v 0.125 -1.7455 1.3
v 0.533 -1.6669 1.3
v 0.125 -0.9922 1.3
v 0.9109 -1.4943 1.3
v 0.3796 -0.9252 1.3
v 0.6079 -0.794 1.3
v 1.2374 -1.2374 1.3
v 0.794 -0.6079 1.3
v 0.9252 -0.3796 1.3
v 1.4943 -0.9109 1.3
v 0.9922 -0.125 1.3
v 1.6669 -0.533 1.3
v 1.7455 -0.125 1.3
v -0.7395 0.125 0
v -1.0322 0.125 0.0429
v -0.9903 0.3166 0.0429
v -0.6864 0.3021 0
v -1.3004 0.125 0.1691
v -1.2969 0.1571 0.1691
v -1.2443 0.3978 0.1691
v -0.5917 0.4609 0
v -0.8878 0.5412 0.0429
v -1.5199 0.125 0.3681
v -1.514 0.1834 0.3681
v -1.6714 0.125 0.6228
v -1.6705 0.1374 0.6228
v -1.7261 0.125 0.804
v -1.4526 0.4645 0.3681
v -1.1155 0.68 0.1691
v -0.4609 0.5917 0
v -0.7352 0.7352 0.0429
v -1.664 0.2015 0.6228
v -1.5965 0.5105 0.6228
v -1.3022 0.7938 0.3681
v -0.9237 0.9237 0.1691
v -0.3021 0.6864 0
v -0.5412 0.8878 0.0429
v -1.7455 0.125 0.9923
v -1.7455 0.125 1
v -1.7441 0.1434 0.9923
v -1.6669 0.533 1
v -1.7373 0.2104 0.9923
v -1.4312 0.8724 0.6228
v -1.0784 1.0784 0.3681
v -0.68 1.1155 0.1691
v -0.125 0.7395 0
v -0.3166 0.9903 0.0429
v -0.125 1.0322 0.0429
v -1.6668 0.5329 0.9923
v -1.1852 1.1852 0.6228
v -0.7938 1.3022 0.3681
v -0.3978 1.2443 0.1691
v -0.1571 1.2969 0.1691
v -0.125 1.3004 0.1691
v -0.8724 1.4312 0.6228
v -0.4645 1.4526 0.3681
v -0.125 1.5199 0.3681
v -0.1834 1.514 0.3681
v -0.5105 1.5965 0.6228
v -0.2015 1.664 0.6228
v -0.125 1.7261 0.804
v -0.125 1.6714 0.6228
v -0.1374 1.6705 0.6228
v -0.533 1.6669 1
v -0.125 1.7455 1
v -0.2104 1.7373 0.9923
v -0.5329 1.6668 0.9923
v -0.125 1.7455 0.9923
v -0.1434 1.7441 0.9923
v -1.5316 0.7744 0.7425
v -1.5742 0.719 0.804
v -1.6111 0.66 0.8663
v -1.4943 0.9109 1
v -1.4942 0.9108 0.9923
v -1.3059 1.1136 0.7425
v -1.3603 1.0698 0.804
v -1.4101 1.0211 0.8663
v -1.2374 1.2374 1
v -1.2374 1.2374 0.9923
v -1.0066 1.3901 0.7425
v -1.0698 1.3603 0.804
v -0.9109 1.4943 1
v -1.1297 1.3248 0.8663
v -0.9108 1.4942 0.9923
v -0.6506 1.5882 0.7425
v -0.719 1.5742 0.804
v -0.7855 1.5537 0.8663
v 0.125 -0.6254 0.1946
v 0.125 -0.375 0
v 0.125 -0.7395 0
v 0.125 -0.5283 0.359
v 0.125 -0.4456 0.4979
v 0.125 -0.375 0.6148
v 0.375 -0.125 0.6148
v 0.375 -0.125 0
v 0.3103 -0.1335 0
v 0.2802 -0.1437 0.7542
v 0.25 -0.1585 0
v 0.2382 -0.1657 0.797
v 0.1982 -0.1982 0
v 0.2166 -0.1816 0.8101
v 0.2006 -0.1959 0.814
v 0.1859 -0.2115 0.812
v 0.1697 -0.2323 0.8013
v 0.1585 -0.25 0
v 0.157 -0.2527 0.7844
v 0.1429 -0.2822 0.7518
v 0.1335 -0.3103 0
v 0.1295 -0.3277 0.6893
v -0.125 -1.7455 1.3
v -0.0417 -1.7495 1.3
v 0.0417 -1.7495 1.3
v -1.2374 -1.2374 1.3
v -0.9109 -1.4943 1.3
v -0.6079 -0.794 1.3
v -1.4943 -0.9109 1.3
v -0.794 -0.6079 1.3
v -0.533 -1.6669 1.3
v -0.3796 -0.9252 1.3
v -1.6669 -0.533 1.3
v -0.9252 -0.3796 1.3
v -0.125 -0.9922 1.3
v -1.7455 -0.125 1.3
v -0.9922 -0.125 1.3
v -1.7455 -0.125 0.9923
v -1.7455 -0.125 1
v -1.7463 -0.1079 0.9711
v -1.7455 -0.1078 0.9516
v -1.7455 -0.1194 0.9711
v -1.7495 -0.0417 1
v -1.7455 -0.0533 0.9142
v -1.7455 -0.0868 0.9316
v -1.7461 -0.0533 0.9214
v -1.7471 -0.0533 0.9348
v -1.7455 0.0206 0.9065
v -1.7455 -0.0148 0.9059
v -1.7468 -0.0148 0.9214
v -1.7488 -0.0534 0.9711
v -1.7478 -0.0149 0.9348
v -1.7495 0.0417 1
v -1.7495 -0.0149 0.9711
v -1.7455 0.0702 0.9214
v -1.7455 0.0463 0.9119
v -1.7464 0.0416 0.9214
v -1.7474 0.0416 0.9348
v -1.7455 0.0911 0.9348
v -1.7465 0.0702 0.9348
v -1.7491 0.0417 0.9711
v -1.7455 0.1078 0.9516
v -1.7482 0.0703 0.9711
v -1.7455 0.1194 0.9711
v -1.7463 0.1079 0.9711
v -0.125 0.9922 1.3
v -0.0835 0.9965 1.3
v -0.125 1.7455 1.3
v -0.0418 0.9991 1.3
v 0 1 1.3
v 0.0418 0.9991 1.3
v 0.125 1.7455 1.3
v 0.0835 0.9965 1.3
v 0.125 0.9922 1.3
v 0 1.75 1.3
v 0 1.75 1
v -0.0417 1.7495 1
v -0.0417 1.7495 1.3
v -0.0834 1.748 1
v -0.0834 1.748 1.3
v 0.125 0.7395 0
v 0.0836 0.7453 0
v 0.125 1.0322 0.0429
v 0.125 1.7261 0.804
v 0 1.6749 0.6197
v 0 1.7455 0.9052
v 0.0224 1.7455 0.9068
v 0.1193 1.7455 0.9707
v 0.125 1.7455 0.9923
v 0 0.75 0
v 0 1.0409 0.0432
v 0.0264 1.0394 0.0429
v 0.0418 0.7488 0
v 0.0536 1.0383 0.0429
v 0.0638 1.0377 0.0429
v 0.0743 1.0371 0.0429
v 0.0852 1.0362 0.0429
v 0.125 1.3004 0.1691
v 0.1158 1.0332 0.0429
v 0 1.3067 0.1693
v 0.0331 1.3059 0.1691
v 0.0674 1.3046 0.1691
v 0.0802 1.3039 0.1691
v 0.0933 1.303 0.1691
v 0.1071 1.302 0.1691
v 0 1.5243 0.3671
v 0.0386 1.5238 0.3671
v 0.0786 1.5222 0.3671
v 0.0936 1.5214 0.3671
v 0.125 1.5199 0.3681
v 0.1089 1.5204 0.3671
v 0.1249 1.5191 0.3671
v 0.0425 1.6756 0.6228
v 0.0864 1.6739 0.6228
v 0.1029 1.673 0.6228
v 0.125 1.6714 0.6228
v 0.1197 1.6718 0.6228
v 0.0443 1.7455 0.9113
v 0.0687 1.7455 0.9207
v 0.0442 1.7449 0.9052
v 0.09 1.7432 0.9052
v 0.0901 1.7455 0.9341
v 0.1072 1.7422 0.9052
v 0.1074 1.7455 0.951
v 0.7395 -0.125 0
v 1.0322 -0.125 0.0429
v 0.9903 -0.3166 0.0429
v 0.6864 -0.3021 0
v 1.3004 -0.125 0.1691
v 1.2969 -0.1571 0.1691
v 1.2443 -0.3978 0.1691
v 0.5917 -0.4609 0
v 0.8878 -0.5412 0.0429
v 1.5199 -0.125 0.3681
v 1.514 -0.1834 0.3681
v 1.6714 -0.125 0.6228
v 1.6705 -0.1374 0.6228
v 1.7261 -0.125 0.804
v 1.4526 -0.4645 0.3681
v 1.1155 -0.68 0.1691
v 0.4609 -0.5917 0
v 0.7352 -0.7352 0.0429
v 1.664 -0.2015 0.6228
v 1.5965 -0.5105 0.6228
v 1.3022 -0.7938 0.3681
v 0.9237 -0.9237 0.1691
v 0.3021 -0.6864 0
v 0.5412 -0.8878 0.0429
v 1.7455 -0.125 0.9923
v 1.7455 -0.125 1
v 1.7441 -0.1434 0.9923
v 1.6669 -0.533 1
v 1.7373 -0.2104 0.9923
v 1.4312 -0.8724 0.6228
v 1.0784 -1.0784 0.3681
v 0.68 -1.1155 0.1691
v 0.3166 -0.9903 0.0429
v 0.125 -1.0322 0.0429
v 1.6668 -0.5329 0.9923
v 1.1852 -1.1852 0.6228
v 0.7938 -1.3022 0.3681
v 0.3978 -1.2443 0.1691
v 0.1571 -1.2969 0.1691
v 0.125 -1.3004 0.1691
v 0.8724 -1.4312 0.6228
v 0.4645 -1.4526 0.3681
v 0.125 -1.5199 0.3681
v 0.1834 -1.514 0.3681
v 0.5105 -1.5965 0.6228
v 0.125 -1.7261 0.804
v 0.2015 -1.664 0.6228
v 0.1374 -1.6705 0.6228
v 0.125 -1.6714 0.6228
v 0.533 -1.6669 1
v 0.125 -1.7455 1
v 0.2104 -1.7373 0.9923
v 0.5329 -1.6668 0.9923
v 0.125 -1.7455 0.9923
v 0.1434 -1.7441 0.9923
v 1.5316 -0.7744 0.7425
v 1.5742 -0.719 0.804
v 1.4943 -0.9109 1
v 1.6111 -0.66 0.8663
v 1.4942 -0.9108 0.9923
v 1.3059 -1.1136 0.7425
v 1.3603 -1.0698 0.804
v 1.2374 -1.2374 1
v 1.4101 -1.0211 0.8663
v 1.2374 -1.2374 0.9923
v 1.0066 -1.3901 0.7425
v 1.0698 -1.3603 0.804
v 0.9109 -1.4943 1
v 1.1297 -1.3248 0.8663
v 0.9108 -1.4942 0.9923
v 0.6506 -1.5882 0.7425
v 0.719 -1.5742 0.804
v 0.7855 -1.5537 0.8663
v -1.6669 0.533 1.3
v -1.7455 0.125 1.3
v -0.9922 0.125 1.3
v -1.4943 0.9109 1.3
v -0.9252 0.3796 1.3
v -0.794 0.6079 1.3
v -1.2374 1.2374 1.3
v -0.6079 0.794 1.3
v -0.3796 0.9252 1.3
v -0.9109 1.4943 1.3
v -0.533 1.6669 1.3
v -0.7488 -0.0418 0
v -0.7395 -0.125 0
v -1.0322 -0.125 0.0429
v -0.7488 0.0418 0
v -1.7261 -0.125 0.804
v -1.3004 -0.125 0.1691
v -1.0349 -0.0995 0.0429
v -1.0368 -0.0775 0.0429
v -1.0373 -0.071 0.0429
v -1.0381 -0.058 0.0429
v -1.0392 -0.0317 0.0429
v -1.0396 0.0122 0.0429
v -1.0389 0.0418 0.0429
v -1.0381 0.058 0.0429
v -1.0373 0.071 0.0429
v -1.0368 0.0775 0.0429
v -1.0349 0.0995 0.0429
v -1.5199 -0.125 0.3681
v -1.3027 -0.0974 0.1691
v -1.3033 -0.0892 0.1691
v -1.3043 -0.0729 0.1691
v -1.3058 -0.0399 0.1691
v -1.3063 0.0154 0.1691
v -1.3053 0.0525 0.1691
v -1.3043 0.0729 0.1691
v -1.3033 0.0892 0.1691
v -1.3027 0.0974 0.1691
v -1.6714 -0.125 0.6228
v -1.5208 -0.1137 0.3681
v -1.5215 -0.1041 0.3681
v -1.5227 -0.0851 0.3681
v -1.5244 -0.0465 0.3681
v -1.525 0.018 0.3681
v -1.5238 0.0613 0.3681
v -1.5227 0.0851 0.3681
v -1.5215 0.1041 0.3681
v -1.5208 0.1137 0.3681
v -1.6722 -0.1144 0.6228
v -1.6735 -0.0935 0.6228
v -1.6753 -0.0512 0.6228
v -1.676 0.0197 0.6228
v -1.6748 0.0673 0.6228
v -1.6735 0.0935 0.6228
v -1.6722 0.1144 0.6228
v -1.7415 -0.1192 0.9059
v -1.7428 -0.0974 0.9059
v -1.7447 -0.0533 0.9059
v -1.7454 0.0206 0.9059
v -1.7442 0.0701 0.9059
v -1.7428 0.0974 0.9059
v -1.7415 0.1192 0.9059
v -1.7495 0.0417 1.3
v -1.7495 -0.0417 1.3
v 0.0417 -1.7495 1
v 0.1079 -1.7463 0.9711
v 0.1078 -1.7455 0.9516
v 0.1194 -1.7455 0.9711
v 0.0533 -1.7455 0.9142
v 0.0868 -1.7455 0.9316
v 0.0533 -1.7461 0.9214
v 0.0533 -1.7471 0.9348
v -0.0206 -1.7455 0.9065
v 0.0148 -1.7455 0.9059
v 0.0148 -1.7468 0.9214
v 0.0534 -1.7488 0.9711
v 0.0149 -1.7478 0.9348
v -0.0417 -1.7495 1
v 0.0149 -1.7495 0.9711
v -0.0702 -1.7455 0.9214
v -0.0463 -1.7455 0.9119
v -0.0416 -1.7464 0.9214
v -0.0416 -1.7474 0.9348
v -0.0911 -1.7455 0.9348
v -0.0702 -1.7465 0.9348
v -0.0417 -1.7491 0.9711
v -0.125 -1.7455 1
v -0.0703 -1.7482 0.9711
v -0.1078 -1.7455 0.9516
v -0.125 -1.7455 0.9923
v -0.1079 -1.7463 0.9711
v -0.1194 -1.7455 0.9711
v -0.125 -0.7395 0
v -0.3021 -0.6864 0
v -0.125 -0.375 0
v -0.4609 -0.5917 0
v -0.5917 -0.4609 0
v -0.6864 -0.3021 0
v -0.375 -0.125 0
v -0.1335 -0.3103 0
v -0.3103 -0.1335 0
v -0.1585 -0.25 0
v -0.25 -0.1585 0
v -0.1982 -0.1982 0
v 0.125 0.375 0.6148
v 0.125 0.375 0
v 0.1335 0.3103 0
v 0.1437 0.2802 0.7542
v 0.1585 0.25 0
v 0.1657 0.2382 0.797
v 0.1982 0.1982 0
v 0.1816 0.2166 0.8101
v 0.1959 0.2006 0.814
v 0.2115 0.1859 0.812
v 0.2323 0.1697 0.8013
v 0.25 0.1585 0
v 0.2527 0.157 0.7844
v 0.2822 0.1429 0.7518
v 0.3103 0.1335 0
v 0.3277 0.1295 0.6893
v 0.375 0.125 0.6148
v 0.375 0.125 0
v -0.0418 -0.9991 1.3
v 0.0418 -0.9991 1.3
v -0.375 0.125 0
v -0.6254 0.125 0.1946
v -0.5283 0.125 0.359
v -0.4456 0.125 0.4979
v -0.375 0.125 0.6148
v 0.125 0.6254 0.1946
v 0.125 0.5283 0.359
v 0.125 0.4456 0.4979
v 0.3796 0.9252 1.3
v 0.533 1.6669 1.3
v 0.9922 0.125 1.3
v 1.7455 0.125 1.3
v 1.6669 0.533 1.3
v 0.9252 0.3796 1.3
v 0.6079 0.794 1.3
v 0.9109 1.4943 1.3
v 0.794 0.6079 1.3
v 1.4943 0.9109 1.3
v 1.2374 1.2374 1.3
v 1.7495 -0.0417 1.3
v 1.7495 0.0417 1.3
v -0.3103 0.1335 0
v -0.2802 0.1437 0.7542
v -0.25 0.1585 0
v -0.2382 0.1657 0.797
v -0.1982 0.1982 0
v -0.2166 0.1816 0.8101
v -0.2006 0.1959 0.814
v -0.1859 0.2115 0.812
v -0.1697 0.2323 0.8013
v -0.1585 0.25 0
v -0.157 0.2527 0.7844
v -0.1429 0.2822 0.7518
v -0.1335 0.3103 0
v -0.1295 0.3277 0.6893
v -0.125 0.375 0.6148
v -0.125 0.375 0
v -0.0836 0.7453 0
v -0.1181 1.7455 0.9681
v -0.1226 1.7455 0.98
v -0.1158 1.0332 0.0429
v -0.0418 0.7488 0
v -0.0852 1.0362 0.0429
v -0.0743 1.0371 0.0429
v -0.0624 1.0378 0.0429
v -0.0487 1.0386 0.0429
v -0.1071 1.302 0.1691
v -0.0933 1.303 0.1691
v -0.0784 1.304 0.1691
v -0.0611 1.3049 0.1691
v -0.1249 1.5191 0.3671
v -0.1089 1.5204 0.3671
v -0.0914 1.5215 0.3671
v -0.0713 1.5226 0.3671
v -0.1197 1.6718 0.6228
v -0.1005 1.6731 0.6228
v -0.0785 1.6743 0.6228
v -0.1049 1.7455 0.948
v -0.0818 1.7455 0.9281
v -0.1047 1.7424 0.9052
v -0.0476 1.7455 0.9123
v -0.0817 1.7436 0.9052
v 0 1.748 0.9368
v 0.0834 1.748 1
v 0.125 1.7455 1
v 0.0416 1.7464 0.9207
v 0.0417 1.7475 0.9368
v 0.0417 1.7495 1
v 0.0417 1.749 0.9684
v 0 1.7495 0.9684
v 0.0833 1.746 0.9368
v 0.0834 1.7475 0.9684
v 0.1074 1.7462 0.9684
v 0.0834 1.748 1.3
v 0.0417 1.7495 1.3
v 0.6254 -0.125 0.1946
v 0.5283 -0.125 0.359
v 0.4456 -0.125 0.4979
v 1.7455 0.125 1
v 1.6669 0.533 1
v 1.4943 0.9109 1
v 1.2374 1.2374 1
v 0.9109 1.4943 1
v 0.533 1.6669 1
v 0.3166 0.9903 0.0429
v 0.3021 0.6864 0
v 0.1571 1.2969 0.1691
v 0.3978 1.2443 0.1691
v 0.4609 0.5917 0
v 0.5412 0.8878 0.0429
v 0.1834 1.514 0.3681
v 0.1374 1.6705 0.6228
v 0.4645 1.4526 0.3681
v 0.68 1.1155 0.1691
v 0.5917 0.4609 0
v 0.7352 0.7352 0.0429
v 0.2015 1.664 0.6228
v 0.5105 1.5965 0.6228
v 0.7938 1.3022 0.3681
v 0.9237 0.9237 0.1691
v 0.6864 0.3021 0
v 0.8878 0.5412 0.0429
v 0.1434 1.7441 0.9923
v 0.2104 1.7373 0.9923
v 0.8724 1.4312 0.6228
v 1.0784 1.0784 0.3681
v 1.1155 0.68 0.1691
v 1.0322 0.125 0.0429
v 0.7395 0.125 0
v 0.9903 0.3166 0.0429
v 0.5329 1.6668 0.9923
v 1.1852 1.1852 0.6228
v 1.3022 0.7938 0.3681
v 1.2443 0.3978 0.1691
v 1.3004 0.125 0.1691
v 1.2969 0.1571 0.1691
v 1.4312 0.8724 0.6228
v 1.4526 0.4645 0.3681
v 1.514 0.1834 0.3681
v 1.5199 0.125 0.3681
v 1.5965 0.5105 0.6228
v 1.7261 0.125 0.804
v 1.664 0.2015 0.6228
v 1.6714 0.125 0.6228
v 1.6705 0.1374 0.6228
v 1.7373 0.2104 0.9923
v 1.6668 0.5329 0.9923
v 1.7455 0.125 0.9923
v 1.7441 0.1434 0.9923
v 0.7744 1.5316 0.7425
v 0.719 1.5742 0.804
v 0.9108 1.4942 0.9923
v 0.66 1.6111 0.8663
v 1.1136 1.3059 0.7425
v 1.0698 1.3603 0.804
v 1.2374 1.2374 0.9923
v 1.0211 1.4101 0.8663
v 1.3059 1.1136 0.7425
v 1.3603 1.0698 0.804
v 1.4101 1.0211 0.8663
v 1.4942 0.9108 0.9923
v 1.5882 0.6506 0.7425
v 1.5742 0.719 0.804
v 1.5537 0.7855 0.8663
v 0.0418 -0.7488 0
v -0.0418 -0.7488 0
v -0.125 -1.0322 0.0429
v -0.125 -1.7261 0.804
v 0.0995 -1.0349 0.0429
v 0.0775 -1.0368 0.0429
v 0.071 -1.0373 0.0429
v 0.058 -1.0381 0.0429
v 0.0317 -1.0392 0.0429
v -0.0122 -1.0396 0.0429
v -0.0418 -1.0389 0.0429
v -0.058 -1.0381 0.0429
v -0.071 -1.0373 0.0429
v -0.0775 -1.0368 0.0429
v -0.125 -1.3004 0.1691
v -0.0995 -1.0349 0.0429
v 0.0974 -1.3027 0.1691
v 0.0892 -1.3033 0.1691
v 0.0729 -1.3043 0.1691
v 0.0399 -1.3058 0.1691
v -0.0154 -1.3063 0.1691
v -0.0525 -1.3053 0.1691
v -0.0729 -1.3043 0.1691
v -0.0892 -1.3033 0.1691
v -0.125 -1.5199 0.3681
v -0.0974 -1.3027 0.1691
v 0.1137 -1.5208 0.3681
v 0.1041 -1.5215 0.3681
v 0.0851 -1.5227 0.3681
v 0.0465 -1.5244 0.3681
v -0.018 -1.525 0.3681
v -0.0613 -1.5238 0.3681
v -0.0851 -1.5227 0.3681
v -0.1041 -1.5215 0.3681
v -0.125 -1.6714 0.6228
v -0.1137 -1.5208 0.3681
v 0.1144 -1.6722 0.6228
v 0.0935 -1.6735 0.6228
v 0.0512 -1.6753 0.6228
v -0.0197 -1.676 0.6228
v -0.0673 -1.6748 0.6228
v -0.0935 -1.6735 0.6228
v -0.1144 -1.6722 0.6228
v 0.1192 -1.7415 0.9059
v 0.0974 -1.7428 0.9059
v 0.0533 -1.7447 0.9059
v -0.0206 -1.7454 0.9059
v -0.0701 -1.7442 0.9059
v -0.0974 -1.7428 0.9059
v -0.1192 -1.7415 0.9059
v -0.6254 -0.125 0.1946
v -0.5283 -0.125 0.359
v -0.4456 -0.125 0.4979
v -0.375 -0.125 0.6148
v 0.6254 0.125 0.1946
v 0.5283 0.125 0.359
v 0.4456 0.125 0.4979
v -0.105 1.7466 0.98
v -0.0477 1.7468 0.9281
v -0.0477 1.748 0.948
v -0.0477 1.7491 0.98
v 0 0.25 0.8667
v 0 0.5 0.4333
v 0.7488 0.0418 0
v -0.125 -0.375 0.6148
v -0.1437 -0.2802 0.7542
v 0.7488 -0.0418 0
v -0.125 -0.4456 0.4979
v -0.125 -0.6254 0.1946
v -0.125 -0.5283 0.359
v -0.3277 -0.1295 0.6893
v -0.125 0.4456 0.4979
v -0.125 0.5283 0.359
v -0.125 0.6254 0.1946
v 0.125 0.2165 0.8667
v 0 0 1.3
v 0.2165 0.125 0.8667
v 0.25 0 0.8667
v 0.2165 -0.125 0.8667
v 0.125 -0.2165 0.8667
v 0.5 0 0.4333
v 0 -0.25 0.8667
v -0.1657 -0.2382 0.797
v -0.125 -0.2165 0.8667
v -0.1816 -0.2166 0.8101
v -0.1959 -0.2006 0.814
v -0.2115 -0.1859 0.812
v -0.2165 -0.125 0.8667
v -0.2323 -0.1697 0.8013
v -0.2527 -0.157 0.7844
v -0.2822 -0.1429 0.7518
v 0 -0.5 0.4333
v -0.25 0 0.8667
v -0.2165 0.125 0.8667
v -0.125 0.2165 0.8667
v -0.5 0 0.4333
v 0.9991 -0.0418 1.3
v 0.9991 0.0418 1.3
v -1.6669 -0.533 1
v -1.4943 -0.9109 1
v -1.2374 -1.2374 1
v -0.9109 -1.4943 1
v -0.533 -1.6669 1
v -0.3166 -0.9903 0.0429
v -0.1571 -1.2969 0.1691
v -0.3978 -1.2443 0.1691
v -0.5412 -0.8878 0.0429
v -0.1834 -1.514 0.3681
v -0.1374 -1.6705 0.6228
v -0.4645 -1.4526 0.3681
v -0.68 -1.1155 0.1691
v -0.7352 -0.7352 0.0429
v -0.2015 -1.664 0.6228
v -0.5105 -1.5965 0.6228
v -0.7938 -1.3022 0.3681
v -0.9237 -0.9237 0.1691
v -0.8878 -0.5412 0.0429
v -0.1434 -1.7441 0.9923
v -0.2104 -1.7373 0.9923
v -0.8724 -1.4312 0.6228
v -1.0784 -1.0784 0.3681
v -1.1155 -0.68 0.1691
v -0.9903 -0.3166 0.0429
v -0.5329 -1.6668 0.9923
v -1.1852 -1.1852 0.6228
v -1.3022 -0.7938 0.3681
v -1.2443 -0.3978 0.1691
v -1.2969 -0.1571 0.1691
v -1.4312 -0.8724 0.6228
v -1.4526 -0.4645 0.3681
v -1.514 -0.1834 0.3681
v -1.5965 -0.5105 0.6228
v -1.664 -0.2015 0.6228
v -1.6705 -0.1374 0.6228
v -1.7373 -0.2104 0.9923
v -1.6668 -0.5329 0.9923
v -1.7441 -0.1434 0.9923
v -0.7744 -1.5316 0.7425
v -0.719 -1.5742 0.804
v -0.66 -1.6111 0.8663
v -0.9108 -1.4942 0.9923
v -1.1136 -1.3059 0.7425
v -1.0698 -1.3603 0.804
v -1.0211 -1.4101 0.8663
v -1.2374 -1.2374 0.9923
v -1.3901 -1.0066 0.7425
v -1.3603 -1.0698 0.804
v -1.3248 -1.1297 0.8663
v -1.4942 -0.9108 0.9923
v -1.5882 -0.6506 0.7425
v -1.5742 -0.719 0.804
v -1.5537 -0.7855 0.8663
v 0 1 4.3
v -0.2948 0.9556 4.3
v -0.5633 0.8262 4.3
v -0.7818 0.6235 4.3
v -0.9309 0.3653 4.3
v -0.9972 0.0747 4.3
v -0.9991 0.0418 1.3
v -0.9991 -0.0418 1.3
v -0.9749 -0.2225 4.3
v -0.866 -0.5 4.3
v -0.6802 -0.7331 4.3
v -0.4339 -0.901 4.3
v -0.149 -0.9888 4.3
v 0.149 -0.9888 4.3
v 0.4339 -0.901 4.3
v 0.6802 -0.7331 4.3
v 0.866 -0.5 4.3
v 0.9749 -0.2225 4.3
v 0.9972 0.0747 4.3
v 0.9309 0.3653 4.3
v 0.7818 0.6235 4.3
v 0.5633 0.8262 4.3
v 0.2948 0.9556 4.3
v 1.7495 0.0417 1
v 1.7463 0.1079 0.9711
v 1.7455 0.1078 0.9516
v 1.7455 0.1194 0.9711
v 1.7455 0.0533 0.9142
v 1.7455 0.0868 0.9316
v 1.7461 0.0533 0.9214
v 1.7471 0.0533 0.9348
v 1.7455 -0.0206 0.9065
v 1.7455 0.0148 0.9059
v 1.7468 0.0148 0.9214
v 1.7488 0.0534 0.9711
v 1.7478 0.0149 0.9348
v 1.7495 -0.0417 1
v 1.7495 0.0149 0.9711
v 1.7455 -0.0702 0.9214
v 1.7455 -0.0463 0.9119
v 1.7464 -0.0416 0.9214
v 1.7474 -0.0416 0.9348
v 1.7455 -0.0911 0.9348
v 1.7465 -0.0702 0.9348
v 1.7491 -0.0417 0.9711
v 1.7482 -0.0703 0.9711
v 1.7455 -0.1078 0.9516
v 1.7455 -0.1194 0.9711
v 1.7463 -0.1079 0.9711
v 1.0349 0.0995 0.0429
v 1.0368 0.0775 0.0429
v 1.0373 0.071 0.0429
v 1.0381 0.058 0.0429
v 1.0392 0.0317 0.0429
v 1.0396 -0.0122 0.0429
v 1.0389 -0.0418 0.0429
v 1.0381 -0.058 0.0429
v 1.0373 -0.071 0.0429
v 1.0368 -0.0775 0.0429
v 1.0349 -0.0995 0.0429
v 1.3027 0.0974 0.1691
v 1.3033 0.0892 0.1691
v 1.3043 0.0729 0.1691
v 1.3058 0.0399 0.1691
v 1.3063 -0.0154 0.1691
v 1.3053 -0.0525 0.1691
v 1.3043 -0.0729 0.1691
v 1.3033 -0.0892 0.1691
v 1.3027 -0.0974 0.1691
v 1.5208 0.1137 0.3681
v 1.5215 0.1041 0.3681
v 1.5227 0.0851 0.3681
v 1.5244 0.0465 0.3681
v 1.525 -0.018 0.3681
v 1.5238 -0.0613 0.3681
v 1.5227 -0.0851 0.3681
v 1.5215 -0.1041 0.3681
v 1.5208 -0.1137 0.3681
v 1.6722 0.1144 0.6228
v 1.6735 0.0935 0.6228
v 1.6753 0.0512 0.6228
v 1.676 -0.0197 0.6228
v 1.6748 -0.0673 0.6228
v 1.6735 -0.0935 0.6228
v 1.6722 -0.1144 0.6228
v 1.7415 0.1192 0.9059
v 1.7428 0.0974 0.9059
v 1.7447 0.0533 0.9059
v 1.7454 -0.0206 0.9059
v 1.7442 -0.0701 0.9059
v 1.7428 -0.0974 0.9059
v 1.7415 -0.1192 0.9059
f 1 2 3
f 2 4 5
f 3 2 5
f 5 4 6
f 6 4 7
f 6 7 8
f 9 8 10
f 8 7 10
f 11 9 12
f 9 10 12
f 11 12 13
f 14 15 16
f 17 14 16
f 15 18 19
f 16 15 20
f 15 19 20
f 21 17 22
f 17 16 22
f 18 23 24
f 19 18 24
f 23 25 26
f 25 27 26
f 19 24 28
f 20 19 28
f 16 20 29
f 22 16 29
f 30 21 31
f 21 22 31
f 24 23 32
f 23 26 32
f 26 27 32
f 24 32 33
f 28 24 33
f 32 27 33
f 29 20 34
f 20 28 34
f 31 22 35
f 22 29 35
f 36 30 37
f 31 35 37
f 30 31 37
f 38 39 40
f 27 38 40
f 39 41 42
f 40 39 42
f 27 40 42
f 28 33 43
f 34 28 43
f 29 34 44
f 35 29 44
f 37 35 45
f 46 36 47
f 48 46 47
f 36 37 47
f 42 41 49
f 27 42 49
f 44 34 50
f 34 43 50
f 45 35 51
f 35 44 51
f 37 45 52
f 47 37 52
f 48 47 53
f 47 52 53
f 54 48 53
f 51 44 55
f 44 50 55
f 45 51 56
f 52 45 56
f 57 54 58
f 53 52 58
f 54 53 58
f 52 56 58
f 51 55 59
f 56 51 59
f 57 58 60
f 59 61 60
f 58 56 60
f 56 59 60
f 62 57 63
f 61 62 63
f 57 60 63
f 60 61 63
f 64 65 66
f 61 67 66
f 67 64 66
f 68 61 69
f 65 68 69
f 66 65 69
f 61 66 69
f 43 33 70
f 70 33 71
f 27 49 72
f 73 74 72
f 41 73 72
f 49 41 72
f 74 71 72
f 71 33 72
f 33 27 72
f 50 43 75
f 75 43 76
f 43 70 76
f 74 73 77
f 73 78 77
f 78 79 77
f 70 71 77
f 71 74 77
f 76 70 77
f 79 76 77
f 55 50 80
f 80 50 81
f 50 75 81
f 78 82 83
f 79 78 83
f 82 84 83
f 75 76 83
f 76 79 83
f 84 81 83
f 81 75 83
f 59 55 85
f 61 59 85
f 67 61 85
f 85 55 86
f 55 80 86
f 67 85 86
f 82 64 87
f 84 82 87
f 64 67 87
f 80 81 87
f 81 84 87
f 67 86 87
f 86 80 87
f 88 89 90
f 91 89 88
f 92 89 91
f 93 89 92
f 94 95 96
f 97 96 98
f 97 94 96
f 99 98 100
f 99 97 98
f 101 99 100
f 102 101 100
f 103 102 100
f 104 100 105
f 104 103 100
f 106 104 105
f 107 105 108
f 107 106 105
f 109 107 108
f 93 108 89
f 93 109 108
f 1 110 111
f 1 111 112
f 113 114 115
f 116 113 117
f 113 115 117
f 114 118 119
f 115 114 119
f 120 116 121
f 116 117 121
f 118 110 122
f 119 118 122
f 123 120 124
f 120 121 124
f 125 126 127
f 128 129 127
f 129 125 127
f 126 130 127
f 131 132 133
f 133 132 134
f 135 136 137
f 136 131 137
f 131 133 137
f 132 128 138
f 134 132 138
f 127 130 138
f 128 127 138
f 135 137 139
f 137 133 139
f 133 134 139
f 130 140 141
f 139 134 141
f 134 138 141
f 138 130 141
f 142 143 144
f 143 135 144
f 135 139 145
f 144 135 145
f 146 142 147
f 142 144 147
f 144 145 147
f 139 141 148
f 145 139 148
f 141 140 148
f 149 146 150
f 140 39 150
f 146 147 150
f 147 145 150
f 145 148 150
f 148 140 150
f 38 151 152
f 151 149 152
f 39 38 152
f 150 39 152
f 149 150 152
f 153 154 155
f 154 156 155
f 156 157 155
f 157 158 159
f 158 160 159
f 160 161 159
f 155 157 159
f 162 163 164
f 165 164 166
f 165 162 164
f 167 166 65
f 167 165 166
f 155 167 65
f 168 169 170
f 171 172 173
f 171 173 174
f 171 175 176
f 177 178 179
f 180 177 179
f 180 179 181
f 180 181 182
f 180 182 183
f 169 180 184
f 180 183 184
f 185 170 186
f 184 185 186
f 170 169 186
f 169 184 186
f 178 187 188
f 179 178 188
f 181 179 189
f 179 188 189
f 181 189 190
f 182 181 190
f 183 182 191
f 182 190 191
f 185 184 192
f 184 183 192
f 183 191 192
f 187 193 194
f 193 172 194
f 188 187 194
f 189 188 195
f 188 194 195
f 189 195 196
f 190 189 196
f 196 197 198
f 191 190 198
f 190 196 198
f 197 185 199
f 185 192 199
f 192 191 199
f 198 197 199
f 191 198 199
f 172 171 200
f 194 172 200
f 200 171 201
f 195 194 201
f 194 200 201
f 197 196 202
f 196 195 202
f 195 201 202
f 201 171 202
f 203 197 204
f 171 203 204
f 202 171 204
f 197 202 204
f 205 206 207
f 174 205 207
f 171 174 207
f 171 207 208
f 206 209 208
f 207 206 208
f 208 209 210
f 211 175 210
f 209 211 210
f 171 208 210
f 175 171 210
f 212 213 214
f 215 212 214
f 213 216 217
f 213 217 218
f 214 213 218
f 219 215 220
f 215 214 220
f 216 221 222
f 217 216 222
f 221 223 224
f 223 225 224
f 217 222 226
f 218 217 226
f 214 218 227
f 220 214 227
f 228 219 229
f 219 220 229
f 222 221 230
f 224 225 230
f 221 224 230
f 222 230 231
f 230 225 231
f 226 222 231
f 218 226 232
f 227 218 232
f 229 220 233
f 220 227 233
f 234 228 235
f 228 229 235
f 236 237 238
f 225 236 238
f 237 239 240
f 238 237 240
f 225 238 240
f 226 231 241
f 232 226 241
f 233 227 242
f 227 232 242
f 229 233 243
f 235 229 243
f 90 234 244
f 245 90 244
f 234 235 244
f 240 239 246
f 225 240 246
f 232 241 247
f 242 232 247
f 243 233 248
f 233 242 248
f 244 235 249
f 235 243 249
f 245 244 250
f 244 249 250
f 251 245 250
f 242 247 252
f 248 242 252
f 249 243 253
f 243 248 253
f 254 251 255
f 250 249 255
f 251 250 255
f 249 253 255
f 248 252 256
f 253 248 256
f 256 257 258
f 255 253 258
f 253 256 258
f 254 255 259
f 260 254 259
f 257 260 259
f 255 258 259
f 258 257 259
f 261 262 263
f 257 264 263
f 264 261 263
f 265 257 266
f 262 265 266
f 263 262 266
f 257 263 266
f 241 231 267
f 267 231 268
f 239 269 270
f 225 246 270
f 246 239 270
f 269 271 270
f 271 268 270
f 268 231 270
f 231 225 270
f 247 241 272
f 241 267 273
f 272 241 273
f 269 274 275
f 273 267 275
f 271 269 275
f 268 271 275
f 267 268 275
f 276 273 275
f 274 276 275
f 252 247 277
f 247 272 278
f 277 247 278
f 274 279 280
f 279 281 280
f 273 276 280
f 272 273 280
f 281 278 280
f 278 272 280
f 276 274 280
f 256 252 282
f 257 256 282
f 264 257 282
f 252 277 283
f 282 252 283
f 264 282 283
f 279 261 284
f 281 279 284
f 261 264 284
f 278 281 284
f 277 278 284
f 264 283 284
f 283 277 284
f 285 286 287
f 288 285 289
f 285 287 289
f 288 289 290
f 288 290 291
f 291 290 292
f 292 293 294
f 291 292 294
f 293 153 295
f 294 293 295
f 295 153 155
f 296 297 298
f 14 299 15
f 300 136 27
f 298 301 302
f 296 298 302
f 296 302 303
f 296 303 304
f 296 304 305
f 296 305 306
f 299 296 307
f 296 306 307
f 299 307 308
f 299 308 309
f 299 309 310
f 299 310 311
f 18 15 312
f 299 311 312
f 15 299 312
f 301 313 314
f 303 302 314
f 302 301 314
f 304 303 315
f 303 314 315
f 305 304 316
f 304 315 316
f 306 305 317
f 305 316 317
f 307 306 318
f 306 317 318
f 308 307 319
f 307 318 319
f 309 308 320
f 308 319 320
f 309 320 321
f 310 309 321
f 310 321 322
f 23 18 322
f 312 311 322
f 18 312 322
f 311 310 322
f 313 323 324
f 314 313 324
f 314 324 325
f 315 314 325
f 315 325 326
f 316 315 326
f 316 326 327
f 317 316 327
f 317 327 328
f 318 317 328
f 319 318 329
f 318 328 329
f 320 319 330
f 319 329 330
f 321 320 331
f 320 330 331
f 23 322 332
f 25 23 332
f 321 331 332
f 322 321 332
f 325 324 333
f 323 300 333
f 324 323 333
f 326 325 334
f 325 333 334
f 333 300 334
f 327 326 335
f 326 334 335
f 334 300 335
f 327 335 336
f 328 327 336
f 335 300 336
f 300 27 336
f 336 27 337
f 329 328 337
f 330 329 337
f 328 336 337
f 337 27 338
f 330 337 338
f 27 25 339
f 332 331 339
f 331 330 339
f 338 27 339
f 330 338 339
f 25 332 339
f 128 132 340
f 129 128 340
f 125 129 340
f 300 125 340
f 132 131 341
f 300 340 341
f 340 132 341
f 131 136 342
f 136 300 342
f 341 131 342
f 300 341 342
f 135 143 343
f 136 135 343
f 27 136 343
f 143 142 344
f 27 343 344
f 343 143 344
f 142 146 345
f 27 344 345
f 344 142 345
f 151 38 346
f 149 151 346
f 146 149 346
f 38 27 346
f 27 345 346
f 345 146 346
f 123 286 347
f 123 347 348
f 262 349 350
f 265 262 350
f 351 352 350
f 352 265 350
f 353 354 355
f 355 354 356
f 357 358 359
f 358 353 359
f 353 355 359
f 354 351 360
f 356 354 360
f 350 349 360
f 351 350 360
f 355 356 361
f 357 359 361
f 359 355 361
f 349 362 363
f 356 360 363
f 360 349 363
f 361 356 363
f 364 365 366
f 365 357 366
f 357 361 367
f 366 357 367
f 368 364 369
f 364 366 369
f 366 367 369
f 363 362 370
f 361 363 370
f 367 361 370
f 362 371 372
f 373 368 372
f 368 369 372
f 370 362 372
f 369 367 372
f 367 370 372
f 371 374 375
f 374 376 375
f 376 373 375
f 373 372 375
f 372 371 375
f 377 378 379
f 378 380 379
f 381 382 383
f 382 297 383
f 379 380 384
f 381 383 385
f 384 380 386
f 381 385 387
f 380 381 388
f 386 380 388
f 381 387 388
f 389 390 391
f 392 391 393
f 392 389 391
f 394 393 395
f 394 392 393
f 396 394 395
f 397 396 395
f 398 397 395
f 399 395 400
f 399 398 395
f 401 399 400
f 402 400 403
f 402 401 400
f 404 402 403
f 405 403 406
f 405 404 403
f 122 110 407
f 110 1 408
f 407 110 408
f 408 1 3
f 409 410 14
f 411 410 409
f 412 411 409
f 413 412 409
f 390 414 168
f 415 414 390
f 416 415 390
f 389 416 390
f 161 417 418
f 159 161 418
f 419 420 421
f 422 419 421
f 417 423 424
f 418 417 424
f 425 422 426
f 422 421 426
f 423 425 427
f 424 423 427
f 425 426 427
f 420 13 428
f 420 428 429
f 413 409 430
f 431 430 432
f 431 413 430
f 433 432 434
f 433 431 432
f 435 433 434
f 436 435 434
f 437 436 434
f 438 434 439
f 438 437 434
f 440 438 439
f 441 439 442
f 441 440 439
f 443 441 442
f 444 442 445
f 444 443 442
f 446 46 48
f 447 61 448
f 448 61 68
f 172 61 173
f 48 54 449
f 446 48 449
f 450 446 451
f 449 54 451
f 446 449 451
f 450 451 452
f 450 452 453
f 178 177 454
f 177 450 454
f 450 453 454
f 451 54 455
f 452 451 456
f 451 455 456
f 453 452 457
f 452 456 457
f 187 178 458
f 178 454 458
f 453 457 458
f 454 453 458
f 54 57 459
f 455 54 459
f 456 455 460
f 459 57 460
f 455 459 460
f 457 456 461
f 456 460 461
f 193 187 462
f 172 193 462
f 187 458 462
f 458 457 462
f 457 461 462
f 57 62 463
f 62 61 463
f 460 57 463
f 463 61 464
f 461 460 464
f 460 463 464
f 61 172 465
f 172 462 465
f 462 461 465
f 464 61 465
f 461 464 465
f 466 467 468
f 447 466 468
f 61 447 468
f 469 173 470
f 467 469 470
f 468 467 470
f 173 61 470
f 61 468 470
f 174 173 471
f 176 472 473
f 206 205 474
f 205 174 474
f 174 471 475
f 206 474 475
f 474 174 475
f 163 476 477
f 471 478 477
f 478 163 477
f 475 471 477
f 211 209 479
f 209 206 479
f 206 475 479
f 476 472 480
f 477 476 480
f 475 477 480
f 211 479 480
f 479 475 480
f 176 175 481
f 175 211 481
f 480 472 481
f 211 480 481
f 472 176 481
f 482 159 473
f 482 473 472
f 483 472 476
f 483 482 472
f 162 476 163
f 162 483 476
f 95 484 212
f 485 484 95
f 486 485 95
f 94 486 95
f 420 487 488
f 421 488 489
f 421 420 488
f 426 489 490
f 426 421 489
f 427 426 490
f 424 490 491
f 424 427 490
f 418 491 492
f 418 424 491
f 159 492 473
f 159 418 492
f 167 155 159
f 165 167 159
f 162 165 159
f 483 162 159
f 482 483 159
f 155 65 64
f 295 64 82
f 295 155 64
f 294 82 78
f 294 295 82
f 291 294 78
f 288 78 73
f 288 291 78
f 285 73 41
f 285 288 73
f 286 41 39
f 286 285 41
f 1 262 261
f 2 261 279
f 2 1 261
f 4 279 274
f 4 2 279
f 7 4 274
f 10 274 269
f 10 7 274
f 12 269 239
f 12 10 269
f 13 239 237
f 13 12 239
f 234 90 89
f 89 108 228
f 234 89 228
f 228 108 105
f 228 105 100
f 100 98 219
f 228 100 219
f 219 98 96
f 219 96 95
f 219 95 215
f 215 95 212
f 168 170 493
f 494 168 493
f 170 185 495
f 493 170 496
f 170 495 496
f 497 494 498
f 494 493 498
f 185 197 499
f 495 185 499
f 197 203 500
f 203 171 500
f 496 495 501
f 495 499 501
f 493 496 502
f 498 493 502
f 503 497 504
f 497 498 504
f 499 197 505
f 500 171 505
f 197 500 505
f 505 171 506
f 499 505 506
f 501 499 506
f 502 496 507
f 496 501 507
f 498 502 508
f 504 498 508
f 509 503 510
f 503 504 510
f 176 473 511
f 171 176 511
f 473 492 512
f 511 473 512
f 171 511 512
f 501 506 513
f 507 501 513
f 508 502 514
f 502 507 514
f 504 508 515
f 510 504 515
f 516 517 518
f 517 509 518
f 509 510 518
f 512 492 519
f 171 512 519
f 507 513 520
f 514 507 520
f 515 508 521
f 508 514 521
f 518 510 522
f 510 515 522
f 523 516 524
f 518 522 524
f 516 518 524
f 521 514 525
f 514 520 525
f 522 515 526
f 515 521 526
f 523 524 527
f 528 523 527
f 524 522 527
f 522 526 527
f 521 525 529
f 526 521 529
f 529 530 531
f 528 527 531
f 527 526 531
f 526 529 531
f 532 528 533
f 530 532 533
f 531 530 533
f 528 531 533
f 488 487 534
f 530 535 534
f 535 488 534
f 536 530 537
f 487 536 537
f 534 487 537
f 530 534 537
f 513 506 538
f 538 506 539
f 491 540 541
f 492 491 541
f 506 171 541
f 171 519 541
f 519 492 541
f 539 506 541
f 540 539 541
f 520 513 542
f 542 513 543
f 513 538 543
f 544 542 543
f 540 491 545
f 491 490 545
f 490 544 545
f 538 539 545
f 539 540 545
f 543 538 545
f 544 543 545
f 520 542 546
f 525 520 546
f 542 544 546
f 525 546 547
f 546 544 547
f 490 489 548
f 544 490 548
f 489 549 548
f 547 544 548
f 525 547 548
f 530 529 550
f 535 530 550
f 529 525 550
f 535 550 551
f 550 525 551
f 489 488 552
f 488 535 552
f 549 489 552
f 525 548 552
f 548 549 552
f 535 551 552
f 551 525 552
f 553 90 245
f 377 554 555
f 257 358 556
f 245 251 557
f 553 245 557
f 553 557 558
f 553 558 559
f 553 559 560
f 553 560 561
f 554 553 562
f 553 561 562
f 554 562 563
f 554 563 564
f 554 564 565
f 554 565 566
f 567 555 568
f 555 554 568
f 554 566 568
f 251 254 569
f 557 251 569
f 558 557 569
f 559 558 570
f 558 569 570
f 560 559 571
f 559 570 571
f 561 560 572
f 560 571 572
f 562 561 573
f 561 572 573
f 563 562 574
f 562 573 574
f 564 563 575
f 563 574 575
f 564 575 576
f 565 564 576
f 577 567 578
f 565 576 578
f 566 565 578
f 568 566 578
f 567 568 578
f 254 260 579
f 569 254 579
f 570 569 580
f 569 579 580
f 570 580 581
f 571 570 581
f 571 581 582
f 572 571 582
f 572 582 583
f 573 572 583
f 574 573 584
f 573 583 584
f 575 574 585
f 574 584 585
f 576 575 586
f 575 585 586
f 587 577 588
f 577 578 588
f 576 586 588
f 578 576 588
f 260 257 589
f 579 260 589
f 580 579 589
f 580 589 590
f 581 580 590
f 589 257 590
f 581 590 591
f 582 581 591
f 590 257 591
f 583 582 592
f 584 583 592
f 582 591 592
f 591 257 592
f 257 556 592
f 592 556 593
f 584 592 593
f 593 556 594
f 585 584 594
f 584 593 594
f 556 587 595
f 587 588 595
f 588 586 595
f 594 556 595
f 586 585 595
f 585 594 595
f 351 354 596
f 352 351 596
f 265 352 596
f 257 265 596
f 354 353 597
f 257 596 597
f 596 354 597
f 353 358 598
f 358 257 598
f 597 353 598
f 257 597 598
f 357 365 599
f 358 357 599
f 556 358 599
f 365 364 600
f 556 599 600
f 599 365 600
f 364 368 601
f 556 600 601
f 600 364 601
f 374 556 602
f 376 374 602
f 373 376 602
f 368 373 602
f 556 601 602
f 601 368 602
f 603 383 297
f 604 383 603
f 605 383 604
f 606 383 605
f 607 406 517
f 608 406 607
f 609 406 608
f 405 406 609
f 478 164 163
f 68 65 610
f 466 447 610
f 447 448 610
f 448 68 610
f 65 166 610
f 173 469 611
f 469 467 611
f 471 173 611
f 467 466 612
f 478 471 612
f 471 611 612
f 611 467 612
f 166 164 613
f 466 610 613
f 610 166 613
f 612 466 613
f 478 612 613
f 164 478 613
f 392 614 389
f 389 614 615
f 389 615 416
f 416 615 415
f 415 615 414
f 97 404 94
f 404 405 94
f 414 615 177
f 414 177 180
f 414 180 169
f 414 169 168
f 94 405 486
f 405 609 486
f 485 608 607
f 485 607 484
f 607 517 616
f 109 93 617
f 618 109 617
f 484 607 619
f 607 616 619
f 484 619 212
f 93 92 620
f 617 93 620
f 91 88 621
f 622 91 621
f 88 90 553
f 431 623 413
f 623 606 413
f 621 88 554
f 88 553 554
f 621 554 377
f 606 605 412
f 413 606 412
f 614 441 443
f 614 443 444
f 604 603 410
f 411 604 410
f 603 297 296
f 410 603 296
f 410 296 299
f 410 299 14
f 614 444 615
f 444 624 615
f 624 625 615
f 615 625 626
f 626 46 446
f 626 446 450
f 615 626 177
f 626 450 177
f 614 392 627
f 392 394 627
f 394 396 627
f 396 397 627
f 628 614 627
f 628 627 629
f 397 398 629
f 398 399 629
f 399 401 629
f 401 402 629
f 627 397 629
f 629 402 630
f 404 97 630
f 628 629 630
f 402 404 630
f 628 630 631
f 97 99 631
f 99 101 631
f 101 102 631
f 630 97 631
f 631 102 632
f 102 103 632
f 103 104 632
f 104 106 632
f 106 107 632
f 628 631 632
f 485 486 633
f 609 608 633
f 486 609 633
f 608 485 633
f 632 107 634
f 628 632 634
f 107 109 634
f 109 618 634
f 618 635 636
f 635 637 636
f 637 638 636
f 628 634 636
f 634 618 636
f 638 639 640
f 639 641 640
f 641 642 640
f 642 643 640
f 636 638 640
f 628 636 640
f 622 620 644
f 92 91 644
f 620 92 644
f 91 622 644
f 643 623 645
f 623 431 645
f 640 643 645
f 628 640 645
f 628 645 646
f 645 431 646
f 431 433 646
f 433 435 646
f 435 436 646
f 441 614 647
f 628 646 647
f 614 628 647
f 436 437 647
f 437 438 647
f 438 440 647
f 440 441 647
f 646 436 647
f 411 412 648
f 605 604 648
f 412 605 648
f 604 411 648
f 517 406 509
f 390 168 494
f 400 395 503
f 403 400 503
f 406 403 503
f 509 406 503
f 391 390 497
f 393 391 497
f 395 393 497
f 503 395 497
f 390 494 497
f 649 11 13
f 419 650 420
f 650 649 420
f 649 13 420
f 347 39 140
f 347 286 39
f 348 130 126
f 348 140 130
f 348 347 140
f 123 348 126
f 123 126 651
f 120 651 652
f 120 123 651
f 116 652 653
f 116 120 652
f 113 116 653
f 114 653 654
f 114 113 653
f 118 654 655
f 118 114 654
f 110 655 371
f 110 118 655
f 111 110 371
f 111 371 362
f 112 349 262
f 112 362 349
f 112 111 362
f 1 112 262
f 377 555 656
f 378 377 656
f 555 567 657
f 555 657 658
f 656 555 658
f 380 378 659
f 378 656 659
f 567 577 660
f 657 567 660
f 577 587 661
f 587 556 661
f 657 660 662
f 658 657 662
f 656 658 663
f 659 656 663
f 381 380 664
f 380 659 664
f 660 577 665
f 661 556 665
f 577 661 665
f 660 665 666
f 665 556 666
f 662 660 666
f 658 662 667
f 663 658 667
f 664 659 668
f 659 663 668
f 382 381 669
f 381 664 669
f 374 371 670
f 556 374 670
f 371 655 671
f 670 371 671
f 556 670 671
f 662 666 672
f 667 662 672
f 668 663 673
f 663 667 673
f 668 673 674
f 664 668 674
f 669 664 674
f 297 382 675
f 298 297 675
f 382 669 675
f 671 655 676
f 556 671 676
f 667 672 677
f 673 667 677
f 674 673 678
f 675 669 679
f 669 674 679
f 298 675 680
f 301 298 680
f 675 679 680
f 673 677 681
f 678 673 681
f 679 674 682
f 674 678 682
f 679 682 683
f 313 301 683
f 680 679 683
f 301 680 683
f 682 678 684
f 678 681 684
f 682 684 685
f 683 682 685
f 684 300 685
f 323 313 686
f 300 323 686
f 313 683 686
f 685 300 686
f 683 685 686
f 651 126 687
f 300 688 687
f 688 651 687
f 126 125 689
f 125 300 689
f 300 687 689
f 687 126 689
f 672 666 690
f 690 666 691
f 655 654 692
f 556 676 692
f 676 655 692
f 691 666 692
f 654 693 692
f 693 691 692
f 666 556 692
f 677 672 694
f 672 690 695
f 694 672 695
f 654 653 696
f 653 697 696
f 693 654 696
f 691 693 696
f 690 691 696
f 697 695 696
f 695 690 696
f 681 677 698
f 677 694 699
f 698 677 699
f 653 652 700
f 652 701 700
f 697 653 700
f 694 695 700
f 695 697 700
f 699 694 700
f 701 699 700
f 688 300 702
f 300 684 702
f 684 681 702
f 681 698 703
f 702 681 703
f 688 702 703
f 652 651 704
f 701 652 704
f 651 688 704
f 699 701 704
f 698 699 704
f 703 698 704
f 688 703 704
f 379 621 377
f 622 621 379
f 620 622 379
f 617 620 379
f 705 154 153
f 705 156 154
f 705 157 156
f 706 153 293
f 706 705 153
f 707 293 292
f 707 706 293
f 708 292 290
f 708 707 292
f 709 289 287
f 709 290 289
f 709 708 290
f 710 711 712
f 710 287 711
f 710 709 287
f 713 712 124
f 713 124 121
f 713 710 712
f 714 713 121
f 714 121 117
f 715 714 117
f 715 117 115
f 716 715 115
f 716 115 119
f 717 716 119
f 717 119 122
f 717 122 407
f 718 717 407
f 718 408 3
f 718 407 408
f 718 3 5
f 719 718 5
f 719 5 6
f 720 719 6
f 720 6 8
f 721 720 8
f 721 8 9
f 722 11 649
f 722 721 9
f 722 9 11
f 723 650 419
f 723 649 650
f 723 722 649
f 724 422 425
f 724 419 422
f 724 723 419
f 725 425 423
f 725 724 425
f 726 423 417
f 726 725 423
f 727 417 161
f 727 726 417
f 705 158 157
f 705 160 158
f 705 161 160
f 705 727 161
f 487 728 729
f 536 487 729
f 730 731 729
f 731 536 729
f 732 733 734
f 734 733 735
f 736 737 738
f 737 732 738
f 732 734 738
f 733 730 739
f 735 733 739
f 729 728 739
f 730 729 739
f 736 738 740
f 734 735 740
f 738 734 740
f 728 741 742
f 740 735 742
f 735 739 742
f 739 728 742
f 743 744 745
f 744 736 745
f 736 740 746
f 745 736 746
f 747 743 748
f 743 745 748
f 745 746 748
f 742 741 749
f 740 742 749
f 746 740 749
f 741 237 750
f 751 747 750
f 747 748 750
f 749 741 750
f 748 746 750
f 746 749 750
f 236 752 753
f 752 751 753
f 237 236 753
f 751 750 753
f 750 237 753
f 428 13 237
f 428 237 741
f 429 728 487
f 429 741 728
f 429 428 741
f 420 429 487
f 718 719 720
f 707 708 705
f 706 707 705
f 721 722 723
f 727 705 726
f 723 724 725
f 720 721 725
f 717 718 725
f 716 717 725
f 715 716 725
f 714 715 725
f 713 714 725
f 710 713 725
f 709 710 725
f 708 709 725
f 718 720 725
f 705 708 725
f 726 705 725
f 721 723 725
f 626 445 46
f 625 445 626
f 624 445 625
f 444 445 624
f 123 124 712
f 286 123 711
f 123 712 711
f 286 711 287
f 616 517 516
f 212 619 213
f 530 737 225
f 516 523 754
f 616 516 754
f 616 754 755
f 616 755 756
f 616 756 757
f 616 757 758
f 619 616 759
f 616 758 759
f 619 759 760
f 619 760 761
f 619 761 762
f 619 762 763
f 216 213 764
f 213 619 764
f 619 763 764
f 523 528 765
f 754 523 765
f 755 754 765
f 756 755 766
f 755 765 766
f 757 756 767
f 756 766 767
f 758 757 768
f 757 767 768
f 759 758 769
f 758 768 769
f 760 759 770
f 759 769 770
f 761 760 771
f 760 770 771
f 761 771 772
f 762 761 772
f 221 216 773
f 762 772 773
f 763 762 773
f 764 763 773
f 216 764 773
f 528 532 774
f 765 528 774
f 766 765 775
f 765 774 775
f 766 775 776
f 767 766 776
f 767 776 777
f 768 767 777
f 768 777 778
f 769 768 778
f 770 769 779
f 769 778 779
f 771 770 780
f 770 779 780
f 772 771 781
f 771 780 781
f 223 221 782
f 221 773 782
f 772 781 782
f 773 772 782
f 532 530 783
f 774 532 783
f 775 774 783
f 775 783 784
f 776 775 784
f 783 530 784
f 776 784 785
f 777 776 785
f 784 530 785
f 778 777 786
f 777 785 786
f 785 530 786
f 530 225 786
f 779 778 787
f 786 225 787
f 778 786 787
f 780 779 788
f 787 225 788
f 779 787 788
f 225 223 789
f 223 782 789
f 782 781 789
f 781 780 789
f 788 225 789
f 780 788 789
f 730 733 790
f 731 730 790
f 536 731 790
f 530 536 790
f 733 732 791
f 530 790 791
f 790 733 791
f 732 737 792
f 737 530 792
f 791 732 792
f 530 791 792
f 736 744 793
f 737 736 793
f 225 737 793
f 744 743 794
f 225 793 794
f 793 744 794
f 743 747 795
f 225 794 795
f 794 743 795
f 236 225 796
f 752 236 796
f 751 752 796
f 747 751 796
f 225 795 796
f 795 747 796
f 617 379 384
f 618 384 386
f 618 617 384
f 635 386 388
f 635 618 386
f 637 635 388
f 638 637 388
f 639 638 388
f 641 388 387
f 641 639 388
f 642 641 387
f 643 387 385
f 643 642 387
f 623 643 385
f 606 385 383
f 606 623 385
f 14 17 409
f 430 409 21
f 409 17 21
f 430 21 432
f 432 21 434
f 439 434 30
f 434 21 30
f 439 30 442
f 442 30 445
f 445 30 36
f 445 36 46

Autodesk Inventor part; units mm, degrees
ref_plane "YZ Plane" through (0, 0, 0) normal (1, 0, 0) x (0, 1, 0)
ref_plane "XZ Plane" through (0, 0, 0) normal (0, 1, 0) x (-1, 0, 0)
ref_plane "XY Plane" through (0, 0, 0) normal (0, 0, 1) x (1, 0, 0)
sketch "スケッチ1" plane through (0, 0, 0) normal (1, 0, 0) x (0, 1, 0)
  line L0 (0, 4.3) -> (0, 0)
  line L1 (0, 0) -> (0.75, 0)
  line L2 (1.75, 1) -> (1.75, 1.3)
  line L3 (1.75, 1.3) -> (1, 1.3)
  line L4 (1, 1.3) -> (1, 4.3)
  line L5 (1, 4.3) -> (0, 4.3)
  line L6 (0.75, 0) -> (0, 1.3)
  arc A0 (0.75, 0) -> (1.75, 1) centre (0.75, 1) ccw
  line L7 (0.75, 0) -> (1.75, 0)
  line L8 (1.75, 0) -> (1.75, 1)
  dimension "d2" = 1.3
  dimension "d10" = 3
  dimension "d11" = 2
  dimension "d12" = 3.5
  dimension "d14" = 1
revolve "回転1" add sketch "スケッチ1" angle 360 about axis through (0, 0, 4.3) along (0, 0, -1) contours L5 L4 L3 L2 A0 L6 L0
thread "ねじ1" size "M2x0.4" class "6g" standard "ANSI Metric M Profile" full length
sketch "スケッチ2" plane through (0, 0, 1.3) normal (0, 0, 1) x (1, 0, 0)
  line L0 (0.125, -1.7455) -> (-0.125, -1.7455)
  line L1 (-0.125, -1.7455) -> (-0.125, -0.375)
  line L2 (-0.125, 1.7455) -> (0.125, 1.7455)
  line L3 (0.125, 1.7455) -> (0.125, 0.375)
  line L4 (0.125, -1.7455) -> (-0.125, 1.7455) construction
  line L5 (-0.125, -1.7455) -> (0.125, 1.7455) construction
  line L6 (-1.7455, 0.125) -> (-0.375, 0.125)
  line L7 (1.7455, 0.125) -> (1.7455, -0.125)
  line L8 (1.7455, -0.125) -> (0.375, -0.125)
  line L9 (-1.7455, -0.125) -> (-1.7455, 0.125)
  line L10 (-1.7455, 0.125) -> (1.7455, -0.125) construction
  line L11 (1.7455, 0.125) -> (-1.7455, -0.125) construction
  line L12 (0.125, -0.375) -> (0.125, -1.7455)
  line L13 (0.375, 0.125) -> (1.7455, 0.125)
  line L14 (-0.375, -0.125) -> (-1.7455, -0.125)
  line L15 (-0.125, 0.375) -> (-0.125, 1.7455)
  arc A0 (0.375, -0.125) -> (0.125, -0.375) centre (0.375, -0.375) ccw
  arc A1 (0.125, 0.375) -> (0.375, 0.125) centre (0.375, 0.375) ccw
  arc A2 (-0.375, 0.125) -> (-0.125, 0.375) centre (-0.375, 0.375) ccw
  arc A3 (-0.125, -0.375) -> (-0.375, -0.125) centre (-0.375, -0.375) ccw
  circle A4 centre (0, 0) radius 1.75 projected
  line L16 (0, 1.75) -> (0, -1.75) construction
  line L17 (1.7455, 0) -> (-1.7455, 0) construction
  point P0 (0, 0)
  point P1 (-0.3339, -0.2226)
  point P2 (-0.3339, 0.2226)
  point P3 (0.3339, 0.2226)
  point P4 (0.3339, -0.2226)
  point P5 (0, 0)
  dimension "d18" = 0.25
  dimension "d19" = 0.25
  dimension "d20" = 0.25
extrude "押し出し2" add sketch "スケッチ2" against normal blind 1.3 contours A4 L0 | L12 A0 L8 A4 | A4 L14 A3 L1 | L7 A4 | A4 L9 | L13 A1 L3 A4 | A4 L15 A2 L6 | L2 A4
revolve "回転2" cut sketch "スケッチ1" angle 360 about axis through (0, 0, 4.3) along (0, 0, -1) contours A0 L8 L7
equation "\"d19\" = d20"
equation "\"d20\" = d18"
properties part number "U-0203" material "Stainless Steel"
